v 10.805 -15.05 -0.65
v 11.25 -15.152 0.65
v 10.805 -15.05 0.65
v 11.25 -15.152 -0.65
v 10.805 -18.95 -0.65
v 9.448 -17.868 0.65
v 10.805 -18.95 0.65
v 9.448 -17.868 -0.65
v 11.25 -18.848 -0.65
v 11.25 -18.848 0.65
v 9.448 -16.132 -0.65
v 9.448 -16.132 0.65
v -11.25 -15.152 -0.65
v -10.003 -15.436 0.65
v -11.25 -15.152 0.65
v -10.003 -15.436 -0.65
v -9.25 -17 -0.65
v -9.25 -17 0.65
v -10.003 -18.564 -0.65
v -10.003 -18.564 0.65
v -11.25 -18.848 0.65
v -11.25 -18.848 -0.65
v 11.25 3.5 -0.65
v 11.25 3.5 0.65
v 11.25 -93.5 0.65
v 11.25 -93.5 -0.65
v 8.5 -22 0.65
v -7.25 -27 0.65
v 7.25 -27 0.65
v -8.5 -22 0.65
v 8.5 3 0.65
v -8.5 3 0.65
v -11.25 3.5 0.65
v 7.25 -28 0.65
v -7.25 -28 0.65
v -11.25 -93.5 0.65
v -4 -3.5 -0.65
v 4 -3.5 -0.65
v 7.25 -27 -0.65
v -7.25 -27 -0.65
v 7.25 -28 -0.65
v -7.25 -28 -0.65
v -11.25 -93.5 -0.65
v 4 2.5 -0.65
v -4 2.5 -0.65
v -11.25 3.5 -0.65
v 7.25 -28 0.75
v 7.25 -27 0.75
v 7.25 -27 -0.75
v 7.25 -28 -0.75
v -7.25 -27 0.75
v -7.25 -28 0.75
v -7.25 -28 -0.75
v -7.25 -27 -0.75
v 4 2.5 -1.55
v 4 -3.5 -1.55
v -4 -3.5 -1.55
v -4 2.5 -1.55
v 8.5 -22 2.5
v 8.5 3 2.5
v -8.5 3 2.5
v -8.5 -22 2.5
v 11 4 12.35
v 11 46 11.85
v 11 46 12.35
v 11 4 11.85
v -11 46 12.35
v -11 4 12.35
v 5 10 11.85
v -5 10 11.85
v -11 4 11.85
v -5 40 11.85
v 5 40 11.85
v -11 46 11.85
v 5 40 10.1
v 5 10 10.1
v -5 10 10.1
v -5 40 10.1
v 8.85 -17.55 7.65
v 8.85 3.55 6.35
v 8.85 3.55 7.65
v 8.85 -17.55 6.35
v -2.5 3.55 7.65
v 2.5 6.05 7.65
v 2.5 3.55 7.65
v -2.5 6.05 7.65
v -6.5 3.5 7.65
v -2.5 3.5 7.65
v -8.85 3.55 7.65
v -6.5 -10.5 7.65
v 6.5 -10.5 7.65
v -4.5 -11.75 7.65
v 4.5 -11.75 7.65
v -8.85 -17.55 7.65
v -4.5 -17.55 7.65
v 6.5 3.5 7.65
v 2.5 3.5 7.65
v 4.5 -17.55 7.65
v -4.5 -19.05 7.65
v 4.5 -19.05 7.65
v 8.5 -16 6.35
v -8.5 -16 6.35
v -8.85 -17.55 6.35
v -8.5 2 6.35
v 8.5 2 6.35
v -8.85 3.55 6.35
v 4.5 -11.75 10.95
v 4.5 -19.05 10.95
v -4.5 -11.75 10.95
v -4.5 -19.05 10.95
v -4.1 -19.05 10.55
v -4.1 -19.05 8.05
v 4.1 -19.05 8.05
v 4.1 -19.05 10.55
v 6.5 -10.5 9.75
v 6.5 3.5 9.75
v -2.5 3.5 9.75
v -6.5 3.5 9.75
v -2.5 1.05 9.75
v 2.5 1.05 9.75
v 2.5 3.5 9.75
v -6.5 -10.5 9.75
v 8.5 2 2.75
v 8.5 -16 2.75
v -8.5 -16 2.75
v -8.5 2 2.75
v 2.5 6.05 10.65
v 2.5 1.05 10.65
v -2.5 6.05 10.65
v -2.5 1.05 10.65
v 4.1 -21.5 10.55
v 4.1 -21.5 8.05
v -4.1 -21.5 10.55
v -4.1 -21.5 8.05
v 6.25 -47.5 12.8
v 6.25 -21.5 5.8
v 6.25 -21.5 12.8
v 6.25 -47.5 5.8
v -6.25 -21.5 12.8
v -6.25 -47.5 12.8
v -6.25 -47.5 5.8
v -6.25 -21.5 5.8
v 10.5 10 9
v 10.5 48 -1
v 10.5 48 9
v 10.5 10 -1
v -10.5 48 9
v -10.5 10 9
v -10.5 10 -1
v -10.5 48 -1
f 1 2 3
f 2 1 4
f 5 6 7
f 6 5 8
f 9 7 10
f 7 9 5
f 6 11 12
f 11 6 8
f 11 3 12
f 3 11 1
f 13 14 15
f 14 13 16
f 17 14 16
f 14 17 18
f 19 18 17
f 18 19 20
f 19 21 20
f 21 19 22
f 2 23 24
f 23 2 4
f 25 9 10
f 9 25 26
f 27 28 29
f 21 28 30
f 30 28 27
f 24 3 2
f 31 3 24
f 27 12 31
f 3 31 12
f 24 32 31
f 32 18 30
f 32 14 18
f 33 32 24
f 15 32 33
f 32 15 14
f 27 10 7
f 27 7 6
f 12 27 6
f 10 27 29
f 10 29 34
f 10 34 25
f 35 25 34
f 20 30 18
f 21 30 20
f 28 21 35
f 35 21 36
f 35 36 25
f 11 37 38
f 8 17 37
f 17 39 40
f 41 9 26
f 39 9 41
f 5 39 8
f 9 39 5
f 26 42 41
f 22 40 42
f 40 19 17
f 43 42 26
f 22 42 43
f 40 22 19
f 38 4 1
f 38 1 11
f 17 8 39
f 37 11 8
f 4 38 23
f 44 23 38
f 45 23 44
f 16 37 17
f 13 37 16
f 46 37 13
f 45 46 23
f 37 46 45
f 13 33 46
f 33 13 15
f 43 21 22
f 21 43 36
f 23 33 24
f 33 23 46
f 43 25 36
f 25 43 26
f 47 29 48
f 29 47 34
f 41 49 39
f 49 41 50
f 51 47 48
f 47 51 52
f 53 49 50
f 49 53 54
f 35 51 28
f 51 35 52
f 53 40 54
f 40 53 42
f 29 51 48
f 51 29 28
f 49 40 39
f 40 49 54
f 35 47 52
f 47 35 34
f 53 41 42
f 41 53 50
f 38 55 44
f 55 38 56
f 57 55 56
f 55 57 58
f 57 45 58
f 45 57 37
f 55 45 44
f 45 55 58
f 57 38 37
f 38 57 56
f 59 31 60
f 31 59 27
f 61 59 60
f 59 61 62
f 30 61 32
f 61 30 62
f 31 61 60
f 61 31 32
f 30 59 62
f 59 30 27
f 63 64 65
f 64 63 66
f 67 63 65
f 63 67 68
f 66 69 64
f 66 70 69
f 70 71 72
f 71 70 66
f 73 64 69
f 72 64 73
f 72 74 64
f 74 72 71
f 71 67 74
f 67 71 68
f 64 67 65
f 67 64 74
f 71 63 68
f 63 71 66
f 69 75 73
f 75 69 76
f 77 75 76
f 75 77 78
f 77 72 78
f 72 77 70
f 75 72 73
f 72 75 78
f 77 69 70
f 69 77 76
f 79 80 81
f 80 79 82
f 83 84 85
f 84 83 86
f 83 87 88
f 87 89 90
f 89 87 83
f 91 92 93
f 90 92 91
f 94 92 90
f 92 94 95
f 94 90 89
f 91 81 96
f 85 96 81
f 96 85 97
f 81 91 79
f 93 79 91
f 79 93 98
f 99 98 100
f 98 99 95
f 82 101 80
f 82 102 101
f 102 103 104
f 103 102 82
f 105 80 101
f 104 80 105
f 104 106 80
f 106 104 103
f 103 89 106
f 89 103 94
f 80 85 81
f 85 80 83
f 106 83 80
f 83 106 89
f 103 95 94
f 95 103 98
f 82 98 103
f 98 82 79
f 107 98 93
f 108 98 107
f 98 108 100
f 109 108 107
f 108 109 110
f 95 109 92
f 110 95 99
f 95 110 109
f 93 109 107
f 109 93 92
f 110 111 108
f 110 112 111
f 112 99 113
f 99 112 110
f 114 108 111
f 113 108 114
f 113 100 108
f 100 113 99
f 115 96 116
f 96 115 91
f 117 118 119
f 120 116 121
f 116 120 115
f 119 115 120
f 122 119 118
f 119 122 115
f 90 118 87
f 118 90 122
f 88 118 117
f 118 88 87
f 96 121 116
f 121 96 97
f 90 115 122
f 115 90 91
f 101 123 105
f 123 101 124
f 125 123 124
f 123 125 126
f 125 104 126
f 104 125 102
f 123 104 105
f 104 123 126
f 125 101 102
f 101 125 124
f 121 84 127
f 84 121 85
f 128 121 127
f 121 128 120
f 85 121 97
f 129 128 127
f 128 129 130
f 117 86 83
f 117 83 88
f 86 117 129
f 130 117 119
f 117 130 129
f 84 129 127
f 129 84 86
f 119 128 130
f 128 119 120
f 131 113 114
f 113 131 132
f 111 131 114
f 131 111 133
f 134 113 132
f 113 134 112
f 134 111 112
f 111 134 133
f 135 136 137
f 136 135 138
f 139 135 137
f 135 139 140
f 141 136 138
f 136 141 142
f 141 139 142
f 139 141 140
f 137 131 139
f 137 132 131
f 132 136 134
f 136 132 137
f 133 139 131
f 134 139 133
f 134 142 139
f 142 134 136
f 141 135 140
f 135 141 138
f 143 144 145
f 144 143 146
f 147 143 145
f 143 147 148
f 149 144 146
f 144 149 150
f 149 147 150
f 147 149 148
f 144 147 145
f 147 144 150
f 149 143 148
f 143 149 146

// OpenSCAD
use <MCAD/boxes.scad>

//$fn=100;

// large battery 1200mAh : 63
// small battery  600mAh : 38
module battery(length, tol=0) {
    cube([21+tol,length+tol,10+tol],center=true);
}

function inc(arr,tol) = [arr[0]+tol,arr[1]+tol,arr[2]+tol];
function incA(arr,tol) = [arr[0]+tol[0],arr[1]+tol[1],arr[2]+tol[2]];

module esp32(tol=0) {
    pcb=[17.7,21.1,1.3];
    usb=[9,7.3,3.3];
    chip=[13,14,2.1];
    resistors=[17,18,3.6];

    union() {
      // PCB
      cube(inc(pcb, tol), center=true);    
      // USB
      translate([0,-pcb[1]/2+usb[1]/2-1.5,usb[2]/2+pcb[2]/2])
       cube(inc(usb, tol), center=true);    
      // chips
      translate([0,+3.5,chip[2]/2+pcb[2]/2])
       cube(chip, center=true);
      // place for resistors (voltage and battery cables)
      translate([0,0,-resistors[2]/2-pcb[2]/2])
       cube(inc(resistors, tol), center=true);
      // BLE antenna connector
      translate([0,pcb[1]/2,pcb[2]/2+1.5])
       cube(inc([5,5,3], tol), center=true);


    }
}

module antenna(tol=[0,0,0]) {
    union(){        
     cube(incA([22,42,0.5], tol),center=true);
     translate([0,0,-1])        
      cube(incA([10,30,2], tol),center=true);
    }
}

module sensor(tol=0, do_hole=true) {
    pcb=[22.5,97,1.3];
    union() {
      difference() {
        cube(inc(pcb, tol), center=true);    
        if (do_hole) {
          translate([+pcb[0]/2,pcb[1]/2-20.5,0])
            cylinder(6,r=4/2,center=true);
          translate([-pcb[0]/2,pcb[1]/2-20.5,0])
            cylinder(6,r=4/2,center=true);
        }
      }
      // limit line
      translate([0,pcb[1]/2-31,0])
        cube([pcb[0]-8,1,pcb[2]+0.2],center=true);
      // soudures
      translate([0,pcb[1]/2-4,-pcb[2]/2+0.1])
        cube(inc([8,6,2], tol),center=true);
      // chip
      translate([0,pcb[1]/2-13,1.5])
        cube(inc([17,25,2],tol),center=true);
    }
}


module cable(tol=0) {
   translate([0,-4,0])
     cube(inc([8.2,8,2.5],tol),center=true);// usb
   translate([0,-18.9,0])
     cube(inc([12.5,30-4,7],tol),center=true); // plug
}

module model(batt_length, tol=0) {
  translate([0,-45,0])
    sensor(tol);      
  translate([0,25,12.1]) // -> moved 2mm down to adapt esp change below
    antenna([tol,tol,tol]);    
  translate([0,10+batt_length/2,4]) // -> moved 1mm down to keep place for antenna cable
    battery(batt_length,tol);
  translate([0,0,-1]) { // moved 3mm down from v8.0 since space was 9mm (mesured) between PCBs, and min could be 4mm (mesured) -> 9mm-4mm and keep 2mm for security.
    translate([0,-7,8])
      rotate([0,0,0])
        esp32(tol);
    translate([0,-15.6,10.3])
      cable(tol);
  }
}


batS=38;
batL=63;
model(batS);
